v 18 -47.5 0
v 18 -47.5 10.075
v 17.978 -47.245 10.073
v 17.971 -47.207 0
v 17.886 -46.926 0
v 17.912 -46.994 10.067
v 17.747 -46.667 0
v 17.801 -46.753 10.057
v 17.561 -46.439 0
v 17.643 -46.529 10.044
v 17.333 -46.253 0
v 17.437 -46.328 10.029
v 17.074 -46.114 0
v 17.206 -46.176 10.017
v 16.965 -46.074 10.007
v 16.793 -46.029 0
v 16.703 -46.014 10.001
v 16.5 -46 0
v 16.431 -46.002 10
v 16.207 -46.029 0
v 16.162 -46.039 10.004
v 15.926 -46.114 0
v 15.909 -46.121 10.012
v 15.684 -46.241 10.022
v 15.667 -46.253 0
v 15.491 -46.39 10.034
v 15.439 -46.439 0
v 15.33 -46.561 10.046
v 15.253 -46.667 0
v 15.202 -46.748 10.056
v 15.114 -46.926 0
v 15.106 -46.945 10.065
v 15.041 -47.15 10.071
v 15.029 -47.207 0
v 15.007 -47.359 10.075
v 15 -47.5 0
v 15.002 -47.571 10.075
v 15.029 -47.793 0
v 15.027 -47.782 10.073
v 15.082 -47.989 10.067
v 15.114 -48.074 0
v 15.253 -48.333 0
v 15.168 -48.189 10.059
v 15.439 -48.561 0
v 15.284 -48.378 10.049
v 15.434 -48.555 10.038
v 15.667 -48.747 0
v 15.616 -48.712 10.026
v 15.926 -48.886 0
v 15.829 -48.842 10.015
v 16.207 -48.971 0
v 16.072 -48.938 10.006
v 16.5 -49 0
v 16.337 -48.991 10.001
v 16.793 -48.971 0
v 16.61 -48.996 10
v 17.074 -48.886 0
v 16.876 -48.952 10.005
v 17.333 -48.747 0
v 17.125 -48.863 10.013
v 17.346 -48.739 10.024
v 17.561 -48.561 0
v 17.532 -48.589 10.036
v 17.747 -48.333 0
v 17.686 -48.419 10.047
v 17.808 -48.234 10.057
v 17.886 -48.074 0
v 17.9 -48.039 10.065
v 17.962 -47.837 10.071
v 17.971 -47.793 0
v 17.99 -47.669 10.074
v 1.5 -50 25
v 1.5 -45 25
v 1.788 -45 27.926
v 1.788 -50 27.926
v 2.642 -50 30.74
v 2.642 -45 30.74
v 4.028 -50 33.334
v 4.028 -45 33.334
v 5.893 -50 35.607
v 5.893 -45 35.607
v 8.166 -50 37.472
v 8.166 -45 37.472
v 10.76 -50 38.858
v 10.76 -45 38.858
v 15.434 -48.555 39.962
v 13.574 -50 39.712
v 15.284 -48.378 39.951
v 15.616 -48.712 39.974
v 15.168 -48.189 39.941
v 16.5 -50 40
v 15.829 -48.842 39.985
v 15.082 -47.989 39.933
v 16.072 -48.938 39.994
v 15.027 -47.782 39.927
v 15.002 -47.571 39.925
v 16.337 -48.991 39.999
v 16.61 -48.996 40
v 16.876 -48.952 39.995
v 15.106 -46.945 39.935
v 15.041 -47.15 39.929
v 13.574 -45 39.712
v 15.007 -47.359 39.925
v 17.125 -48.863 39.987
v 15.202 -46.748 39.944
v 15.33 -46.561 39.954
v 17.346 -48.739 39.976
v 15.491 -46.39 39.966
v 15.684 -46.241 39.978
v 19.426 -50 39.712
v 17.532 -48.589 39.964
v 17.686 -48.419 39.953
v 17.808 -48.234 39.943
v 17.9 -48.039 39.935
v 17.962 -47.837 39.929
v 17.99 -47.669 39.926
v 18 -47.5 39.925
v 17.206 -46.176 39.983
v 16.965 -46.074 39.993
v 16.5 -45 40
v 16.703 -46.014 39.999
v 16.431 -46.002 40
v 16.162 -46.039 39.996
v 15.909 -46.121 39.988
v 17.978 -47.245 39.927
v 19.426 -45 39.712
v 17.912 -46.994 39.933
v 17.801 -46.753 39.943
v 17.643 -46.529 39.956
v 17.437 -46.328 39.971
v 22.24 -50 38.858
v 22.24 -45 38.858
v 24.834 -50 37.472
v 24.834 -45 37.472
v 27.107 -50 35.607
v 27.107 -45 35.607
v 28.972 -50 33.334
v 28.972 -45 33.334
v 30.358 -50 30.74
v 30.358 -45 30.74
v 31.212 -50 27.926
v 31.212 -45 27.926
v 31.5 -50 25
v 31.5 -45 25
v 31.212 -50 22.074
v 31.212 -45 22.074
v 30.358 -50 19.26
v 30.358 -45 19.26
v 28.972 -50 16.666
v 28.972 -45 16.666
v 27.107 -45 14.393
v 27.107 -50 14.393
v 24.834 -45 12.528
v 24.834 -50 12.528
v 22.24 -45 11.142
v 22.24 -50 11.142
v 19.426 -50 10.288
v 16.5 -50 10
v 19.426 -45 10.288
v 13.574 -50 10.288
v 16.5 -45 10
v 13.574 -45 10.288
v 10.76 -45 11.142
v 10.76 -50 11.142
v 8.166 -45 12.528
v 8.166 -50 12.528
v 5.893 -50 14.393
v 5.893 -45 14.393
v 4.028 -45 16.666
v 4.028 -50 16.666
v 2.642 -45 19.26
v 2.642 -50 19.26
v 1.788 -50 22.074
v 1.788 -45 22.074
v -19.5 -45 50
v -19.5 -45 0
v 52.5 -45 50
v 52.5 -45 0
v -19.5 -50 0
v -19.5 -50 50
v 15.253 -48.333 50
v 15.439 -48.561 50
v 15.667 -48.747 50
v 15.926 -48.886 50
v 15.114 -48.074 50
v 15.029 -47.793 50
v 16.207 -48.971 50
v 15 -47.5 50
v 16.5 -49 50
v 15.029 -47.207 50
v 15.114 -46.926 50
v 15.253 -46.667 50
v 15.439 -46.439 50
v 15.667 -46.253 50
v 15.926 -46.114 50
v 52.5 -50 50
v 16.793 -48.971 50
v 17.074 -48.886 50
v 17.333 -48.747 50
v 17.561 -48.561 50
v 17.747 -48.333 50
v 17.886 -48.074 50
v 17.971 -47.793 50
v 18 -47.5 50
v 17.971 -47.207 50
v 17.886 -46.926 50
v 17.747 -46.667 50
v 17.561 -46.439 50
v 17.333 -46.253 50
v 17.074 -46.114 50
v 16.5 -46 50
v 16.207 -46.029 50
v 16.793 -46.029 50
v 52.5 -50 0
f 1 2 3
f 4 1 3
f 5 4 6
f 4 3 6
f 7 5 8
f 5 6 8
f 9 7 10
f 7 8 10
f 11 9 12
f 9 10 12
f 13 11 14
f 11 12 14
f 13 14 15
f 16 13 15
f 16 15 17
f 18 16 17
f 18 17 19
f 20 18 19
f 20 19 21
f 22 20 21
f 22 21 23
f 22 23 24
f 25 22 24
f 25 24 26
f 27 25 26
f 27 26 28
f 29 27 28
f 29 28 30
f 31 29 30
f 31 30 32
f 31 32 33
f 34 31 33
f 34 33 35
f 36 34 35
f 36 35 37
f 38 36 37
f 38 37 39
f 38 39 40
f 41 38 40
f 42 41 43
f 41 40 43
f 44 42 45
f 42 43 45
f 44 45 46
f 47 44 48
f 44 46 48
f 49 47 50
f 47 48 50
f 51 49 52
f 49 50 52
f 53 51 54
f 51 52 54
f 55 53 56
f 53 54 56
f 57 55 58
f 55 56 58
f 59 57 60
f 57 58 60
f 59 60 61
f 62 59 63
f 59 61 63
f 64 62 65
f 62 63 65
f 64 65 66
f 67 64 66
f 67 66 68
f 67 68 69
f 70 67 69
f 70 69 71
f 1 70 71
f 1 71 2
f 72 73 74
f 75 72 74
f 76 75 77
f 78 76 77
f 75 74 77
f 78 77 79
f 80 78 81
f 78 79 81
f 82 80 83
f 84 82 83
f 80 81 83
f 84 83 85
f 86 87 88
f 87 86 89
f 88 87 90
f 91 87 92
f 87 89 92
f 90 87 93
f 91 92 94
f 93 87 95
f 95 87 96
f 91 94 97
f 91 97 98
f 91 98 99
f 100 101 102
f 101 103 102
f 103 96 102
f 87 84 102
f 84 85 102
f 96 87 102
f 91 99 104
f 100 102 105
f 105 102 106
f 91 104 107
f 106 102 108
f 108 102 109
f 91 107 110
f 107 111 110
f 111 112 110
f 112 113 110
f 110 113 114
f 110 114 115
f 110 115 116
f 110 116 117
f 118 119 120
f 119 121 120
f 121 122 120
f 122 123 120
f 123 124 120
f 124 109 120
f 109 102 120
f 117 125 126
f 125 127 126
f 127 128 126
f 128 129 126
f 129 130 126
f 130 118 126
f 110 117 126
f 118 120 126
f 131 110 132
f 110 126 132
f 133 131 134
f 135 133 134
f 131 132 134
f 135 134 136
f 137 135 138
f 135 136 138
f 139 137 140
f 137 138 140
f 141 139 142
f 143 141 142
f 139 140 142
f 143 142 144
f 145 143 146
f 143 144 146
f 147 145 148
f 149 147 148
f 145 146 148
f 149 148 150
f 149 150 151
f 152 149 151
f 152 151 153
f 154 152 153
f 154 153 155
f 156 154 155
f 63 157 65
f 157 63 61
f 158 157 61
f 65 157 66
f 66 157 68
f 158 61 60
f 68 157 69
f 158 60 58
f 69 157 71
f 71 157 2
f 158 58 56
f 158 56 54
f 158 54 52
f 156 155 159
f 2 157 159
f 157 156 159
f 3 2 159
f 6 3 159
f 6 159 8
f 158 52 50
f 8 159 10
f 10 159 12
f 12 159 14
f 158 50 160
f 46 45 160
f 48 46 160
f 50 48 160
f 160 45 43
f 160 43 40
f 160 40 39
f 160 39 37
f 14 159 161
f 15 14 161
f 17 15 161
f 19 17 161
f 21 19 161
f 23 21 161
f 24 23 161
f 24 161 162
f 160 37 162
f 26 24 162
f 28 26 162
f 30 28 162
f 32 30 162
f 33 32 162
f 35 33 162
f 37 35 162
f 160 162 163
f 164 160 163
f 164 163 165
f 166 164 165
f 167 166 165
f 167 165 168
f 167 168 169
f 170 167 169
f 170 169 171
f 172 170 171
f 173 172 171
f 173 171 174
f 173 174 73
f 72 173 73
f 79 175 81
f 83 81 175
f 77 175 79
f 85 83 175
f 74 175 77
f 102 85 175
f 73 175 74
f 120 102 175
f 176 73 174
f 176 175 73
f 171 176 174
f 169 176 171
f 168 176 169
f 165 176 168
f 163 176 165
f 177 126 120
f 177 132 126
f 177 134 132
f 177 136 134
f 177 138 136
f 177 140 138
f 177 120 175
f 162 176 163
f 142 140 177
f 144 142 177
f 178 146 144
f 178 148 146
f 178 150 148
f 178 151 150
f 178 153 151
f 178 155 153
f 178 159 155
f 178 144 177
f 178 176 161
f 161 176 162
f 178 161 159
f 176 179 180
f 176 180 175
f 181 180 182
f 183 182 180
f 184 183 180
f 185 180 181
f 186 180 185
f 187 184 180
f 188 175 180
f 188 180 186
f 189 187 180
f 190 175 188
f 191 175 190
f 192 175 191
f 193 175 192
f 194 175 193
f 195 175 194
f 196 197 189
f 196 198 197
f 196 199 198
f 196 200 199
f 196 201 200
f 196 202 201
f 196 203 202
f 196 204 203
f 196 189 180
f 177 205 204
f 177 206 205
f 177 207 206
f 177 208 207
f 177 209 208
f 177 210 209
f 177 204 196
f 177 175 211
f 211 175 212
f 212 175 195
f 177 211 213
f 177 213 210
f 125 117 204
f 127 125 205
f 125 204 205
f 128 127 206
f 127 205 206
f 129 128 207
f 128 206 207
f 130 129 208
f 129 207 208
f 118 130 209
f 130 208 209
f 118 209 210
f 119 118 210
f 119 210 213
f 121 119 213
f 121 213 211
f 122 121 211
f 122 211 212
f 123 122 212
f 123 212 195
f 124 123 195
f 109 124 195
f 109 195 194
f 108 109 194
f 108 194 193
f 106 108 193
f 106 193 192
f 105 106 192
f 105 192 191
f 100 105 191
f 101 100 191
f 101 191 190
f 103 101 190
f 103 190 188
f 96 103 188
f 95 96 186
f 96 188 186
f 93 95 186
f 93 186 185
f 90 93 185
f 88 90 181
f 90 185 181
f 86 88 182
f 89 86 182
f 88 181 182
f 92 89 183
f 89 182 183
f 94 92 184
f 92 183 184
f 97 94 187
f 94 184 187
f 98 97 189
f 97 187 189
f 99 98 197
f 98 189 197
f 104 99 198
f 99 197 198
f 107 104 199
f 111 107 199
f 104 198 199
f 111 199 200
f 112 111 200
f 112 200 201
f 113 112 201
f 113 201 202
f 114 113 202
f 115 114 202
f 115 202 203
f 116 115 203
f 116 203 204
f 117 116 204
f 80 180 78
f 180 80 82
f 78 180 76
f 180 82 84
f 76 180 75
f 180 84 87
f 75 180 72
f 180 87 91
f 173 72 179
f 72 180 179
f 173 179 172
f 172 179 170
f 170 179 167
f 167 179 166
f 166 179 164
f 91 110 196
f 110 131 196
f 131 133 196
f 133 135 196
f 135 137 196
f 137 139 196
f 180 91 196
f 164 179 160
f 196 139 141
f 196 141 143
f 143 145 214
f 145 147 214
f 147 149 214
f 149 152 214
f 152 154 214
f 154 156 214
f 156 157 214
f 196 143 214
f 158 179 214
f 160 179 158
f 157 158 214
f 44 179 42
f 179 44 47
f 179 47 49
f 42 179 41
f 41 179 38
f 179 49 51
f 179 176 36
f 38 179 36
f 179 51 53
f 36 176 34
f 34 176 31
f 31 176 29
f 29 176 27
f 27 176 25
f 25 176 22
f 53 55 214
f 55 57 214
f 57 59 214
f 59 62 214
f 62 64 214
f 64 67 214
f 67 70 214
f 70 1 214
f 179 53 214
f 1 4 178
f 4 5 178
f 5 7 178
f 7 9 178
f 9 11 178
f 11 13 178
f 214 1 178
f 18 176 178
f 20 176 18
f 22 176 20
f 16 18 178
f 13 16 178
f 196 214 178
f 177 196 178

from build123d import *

# Parameters (mm, degrees)
ESQUISSE1_W             = 72
ESQUISSE1_H             = 5
BOSS_EXTRU_1_DEPTH      = 50
ESQUISSE2_R             = 15
ENL_V_MAT_EXTRU_1_DEPTH = 6
ESQUISSE5_R             = 1.5
ENL_V_MAT_EXTRU_4_DEPTH = 51


with BuildPart() as part:
    # Esquisse1 → Boss.-Extru.1 (new body)
    with BuildSketch(Plane.XY):
        with Locations((16.5, -47.5)):
            Rectangle(ESQUISSE1_W, ESQUISSE1_H)
    extrude(amount=BOSS_EXTRU_1_DEPTH)

    # Esquisse2 → Enlèv. mat.-Extru.1 (cut, through all)
    with BuildSketch(Plane(origin=(0, -45, 0), x_dir=(-1, 0, 0), z_dir=(0, 1, 0))):
        with Locations((-16.5, 25)):
            Circle(ESQUISSE2_R)
    extrude(amount=-ENL_V_MAT_EXTRU_1_DEPTH, mode=Mode.SUBTRACT)

    # Esquisse5 → Enlèv. mat.-Extru.4 (cut, through all)
    with BuildSketch(Plane.XY.offset(50)):
        with Locations((16.5, -47.5)):
            Circle(ESQUISSE5_R)
    extrude(amount=-ENL_V_MAT_EXTRU_4_DEPTH, mode=Mode.SUBTRACT)


solid = part.part
